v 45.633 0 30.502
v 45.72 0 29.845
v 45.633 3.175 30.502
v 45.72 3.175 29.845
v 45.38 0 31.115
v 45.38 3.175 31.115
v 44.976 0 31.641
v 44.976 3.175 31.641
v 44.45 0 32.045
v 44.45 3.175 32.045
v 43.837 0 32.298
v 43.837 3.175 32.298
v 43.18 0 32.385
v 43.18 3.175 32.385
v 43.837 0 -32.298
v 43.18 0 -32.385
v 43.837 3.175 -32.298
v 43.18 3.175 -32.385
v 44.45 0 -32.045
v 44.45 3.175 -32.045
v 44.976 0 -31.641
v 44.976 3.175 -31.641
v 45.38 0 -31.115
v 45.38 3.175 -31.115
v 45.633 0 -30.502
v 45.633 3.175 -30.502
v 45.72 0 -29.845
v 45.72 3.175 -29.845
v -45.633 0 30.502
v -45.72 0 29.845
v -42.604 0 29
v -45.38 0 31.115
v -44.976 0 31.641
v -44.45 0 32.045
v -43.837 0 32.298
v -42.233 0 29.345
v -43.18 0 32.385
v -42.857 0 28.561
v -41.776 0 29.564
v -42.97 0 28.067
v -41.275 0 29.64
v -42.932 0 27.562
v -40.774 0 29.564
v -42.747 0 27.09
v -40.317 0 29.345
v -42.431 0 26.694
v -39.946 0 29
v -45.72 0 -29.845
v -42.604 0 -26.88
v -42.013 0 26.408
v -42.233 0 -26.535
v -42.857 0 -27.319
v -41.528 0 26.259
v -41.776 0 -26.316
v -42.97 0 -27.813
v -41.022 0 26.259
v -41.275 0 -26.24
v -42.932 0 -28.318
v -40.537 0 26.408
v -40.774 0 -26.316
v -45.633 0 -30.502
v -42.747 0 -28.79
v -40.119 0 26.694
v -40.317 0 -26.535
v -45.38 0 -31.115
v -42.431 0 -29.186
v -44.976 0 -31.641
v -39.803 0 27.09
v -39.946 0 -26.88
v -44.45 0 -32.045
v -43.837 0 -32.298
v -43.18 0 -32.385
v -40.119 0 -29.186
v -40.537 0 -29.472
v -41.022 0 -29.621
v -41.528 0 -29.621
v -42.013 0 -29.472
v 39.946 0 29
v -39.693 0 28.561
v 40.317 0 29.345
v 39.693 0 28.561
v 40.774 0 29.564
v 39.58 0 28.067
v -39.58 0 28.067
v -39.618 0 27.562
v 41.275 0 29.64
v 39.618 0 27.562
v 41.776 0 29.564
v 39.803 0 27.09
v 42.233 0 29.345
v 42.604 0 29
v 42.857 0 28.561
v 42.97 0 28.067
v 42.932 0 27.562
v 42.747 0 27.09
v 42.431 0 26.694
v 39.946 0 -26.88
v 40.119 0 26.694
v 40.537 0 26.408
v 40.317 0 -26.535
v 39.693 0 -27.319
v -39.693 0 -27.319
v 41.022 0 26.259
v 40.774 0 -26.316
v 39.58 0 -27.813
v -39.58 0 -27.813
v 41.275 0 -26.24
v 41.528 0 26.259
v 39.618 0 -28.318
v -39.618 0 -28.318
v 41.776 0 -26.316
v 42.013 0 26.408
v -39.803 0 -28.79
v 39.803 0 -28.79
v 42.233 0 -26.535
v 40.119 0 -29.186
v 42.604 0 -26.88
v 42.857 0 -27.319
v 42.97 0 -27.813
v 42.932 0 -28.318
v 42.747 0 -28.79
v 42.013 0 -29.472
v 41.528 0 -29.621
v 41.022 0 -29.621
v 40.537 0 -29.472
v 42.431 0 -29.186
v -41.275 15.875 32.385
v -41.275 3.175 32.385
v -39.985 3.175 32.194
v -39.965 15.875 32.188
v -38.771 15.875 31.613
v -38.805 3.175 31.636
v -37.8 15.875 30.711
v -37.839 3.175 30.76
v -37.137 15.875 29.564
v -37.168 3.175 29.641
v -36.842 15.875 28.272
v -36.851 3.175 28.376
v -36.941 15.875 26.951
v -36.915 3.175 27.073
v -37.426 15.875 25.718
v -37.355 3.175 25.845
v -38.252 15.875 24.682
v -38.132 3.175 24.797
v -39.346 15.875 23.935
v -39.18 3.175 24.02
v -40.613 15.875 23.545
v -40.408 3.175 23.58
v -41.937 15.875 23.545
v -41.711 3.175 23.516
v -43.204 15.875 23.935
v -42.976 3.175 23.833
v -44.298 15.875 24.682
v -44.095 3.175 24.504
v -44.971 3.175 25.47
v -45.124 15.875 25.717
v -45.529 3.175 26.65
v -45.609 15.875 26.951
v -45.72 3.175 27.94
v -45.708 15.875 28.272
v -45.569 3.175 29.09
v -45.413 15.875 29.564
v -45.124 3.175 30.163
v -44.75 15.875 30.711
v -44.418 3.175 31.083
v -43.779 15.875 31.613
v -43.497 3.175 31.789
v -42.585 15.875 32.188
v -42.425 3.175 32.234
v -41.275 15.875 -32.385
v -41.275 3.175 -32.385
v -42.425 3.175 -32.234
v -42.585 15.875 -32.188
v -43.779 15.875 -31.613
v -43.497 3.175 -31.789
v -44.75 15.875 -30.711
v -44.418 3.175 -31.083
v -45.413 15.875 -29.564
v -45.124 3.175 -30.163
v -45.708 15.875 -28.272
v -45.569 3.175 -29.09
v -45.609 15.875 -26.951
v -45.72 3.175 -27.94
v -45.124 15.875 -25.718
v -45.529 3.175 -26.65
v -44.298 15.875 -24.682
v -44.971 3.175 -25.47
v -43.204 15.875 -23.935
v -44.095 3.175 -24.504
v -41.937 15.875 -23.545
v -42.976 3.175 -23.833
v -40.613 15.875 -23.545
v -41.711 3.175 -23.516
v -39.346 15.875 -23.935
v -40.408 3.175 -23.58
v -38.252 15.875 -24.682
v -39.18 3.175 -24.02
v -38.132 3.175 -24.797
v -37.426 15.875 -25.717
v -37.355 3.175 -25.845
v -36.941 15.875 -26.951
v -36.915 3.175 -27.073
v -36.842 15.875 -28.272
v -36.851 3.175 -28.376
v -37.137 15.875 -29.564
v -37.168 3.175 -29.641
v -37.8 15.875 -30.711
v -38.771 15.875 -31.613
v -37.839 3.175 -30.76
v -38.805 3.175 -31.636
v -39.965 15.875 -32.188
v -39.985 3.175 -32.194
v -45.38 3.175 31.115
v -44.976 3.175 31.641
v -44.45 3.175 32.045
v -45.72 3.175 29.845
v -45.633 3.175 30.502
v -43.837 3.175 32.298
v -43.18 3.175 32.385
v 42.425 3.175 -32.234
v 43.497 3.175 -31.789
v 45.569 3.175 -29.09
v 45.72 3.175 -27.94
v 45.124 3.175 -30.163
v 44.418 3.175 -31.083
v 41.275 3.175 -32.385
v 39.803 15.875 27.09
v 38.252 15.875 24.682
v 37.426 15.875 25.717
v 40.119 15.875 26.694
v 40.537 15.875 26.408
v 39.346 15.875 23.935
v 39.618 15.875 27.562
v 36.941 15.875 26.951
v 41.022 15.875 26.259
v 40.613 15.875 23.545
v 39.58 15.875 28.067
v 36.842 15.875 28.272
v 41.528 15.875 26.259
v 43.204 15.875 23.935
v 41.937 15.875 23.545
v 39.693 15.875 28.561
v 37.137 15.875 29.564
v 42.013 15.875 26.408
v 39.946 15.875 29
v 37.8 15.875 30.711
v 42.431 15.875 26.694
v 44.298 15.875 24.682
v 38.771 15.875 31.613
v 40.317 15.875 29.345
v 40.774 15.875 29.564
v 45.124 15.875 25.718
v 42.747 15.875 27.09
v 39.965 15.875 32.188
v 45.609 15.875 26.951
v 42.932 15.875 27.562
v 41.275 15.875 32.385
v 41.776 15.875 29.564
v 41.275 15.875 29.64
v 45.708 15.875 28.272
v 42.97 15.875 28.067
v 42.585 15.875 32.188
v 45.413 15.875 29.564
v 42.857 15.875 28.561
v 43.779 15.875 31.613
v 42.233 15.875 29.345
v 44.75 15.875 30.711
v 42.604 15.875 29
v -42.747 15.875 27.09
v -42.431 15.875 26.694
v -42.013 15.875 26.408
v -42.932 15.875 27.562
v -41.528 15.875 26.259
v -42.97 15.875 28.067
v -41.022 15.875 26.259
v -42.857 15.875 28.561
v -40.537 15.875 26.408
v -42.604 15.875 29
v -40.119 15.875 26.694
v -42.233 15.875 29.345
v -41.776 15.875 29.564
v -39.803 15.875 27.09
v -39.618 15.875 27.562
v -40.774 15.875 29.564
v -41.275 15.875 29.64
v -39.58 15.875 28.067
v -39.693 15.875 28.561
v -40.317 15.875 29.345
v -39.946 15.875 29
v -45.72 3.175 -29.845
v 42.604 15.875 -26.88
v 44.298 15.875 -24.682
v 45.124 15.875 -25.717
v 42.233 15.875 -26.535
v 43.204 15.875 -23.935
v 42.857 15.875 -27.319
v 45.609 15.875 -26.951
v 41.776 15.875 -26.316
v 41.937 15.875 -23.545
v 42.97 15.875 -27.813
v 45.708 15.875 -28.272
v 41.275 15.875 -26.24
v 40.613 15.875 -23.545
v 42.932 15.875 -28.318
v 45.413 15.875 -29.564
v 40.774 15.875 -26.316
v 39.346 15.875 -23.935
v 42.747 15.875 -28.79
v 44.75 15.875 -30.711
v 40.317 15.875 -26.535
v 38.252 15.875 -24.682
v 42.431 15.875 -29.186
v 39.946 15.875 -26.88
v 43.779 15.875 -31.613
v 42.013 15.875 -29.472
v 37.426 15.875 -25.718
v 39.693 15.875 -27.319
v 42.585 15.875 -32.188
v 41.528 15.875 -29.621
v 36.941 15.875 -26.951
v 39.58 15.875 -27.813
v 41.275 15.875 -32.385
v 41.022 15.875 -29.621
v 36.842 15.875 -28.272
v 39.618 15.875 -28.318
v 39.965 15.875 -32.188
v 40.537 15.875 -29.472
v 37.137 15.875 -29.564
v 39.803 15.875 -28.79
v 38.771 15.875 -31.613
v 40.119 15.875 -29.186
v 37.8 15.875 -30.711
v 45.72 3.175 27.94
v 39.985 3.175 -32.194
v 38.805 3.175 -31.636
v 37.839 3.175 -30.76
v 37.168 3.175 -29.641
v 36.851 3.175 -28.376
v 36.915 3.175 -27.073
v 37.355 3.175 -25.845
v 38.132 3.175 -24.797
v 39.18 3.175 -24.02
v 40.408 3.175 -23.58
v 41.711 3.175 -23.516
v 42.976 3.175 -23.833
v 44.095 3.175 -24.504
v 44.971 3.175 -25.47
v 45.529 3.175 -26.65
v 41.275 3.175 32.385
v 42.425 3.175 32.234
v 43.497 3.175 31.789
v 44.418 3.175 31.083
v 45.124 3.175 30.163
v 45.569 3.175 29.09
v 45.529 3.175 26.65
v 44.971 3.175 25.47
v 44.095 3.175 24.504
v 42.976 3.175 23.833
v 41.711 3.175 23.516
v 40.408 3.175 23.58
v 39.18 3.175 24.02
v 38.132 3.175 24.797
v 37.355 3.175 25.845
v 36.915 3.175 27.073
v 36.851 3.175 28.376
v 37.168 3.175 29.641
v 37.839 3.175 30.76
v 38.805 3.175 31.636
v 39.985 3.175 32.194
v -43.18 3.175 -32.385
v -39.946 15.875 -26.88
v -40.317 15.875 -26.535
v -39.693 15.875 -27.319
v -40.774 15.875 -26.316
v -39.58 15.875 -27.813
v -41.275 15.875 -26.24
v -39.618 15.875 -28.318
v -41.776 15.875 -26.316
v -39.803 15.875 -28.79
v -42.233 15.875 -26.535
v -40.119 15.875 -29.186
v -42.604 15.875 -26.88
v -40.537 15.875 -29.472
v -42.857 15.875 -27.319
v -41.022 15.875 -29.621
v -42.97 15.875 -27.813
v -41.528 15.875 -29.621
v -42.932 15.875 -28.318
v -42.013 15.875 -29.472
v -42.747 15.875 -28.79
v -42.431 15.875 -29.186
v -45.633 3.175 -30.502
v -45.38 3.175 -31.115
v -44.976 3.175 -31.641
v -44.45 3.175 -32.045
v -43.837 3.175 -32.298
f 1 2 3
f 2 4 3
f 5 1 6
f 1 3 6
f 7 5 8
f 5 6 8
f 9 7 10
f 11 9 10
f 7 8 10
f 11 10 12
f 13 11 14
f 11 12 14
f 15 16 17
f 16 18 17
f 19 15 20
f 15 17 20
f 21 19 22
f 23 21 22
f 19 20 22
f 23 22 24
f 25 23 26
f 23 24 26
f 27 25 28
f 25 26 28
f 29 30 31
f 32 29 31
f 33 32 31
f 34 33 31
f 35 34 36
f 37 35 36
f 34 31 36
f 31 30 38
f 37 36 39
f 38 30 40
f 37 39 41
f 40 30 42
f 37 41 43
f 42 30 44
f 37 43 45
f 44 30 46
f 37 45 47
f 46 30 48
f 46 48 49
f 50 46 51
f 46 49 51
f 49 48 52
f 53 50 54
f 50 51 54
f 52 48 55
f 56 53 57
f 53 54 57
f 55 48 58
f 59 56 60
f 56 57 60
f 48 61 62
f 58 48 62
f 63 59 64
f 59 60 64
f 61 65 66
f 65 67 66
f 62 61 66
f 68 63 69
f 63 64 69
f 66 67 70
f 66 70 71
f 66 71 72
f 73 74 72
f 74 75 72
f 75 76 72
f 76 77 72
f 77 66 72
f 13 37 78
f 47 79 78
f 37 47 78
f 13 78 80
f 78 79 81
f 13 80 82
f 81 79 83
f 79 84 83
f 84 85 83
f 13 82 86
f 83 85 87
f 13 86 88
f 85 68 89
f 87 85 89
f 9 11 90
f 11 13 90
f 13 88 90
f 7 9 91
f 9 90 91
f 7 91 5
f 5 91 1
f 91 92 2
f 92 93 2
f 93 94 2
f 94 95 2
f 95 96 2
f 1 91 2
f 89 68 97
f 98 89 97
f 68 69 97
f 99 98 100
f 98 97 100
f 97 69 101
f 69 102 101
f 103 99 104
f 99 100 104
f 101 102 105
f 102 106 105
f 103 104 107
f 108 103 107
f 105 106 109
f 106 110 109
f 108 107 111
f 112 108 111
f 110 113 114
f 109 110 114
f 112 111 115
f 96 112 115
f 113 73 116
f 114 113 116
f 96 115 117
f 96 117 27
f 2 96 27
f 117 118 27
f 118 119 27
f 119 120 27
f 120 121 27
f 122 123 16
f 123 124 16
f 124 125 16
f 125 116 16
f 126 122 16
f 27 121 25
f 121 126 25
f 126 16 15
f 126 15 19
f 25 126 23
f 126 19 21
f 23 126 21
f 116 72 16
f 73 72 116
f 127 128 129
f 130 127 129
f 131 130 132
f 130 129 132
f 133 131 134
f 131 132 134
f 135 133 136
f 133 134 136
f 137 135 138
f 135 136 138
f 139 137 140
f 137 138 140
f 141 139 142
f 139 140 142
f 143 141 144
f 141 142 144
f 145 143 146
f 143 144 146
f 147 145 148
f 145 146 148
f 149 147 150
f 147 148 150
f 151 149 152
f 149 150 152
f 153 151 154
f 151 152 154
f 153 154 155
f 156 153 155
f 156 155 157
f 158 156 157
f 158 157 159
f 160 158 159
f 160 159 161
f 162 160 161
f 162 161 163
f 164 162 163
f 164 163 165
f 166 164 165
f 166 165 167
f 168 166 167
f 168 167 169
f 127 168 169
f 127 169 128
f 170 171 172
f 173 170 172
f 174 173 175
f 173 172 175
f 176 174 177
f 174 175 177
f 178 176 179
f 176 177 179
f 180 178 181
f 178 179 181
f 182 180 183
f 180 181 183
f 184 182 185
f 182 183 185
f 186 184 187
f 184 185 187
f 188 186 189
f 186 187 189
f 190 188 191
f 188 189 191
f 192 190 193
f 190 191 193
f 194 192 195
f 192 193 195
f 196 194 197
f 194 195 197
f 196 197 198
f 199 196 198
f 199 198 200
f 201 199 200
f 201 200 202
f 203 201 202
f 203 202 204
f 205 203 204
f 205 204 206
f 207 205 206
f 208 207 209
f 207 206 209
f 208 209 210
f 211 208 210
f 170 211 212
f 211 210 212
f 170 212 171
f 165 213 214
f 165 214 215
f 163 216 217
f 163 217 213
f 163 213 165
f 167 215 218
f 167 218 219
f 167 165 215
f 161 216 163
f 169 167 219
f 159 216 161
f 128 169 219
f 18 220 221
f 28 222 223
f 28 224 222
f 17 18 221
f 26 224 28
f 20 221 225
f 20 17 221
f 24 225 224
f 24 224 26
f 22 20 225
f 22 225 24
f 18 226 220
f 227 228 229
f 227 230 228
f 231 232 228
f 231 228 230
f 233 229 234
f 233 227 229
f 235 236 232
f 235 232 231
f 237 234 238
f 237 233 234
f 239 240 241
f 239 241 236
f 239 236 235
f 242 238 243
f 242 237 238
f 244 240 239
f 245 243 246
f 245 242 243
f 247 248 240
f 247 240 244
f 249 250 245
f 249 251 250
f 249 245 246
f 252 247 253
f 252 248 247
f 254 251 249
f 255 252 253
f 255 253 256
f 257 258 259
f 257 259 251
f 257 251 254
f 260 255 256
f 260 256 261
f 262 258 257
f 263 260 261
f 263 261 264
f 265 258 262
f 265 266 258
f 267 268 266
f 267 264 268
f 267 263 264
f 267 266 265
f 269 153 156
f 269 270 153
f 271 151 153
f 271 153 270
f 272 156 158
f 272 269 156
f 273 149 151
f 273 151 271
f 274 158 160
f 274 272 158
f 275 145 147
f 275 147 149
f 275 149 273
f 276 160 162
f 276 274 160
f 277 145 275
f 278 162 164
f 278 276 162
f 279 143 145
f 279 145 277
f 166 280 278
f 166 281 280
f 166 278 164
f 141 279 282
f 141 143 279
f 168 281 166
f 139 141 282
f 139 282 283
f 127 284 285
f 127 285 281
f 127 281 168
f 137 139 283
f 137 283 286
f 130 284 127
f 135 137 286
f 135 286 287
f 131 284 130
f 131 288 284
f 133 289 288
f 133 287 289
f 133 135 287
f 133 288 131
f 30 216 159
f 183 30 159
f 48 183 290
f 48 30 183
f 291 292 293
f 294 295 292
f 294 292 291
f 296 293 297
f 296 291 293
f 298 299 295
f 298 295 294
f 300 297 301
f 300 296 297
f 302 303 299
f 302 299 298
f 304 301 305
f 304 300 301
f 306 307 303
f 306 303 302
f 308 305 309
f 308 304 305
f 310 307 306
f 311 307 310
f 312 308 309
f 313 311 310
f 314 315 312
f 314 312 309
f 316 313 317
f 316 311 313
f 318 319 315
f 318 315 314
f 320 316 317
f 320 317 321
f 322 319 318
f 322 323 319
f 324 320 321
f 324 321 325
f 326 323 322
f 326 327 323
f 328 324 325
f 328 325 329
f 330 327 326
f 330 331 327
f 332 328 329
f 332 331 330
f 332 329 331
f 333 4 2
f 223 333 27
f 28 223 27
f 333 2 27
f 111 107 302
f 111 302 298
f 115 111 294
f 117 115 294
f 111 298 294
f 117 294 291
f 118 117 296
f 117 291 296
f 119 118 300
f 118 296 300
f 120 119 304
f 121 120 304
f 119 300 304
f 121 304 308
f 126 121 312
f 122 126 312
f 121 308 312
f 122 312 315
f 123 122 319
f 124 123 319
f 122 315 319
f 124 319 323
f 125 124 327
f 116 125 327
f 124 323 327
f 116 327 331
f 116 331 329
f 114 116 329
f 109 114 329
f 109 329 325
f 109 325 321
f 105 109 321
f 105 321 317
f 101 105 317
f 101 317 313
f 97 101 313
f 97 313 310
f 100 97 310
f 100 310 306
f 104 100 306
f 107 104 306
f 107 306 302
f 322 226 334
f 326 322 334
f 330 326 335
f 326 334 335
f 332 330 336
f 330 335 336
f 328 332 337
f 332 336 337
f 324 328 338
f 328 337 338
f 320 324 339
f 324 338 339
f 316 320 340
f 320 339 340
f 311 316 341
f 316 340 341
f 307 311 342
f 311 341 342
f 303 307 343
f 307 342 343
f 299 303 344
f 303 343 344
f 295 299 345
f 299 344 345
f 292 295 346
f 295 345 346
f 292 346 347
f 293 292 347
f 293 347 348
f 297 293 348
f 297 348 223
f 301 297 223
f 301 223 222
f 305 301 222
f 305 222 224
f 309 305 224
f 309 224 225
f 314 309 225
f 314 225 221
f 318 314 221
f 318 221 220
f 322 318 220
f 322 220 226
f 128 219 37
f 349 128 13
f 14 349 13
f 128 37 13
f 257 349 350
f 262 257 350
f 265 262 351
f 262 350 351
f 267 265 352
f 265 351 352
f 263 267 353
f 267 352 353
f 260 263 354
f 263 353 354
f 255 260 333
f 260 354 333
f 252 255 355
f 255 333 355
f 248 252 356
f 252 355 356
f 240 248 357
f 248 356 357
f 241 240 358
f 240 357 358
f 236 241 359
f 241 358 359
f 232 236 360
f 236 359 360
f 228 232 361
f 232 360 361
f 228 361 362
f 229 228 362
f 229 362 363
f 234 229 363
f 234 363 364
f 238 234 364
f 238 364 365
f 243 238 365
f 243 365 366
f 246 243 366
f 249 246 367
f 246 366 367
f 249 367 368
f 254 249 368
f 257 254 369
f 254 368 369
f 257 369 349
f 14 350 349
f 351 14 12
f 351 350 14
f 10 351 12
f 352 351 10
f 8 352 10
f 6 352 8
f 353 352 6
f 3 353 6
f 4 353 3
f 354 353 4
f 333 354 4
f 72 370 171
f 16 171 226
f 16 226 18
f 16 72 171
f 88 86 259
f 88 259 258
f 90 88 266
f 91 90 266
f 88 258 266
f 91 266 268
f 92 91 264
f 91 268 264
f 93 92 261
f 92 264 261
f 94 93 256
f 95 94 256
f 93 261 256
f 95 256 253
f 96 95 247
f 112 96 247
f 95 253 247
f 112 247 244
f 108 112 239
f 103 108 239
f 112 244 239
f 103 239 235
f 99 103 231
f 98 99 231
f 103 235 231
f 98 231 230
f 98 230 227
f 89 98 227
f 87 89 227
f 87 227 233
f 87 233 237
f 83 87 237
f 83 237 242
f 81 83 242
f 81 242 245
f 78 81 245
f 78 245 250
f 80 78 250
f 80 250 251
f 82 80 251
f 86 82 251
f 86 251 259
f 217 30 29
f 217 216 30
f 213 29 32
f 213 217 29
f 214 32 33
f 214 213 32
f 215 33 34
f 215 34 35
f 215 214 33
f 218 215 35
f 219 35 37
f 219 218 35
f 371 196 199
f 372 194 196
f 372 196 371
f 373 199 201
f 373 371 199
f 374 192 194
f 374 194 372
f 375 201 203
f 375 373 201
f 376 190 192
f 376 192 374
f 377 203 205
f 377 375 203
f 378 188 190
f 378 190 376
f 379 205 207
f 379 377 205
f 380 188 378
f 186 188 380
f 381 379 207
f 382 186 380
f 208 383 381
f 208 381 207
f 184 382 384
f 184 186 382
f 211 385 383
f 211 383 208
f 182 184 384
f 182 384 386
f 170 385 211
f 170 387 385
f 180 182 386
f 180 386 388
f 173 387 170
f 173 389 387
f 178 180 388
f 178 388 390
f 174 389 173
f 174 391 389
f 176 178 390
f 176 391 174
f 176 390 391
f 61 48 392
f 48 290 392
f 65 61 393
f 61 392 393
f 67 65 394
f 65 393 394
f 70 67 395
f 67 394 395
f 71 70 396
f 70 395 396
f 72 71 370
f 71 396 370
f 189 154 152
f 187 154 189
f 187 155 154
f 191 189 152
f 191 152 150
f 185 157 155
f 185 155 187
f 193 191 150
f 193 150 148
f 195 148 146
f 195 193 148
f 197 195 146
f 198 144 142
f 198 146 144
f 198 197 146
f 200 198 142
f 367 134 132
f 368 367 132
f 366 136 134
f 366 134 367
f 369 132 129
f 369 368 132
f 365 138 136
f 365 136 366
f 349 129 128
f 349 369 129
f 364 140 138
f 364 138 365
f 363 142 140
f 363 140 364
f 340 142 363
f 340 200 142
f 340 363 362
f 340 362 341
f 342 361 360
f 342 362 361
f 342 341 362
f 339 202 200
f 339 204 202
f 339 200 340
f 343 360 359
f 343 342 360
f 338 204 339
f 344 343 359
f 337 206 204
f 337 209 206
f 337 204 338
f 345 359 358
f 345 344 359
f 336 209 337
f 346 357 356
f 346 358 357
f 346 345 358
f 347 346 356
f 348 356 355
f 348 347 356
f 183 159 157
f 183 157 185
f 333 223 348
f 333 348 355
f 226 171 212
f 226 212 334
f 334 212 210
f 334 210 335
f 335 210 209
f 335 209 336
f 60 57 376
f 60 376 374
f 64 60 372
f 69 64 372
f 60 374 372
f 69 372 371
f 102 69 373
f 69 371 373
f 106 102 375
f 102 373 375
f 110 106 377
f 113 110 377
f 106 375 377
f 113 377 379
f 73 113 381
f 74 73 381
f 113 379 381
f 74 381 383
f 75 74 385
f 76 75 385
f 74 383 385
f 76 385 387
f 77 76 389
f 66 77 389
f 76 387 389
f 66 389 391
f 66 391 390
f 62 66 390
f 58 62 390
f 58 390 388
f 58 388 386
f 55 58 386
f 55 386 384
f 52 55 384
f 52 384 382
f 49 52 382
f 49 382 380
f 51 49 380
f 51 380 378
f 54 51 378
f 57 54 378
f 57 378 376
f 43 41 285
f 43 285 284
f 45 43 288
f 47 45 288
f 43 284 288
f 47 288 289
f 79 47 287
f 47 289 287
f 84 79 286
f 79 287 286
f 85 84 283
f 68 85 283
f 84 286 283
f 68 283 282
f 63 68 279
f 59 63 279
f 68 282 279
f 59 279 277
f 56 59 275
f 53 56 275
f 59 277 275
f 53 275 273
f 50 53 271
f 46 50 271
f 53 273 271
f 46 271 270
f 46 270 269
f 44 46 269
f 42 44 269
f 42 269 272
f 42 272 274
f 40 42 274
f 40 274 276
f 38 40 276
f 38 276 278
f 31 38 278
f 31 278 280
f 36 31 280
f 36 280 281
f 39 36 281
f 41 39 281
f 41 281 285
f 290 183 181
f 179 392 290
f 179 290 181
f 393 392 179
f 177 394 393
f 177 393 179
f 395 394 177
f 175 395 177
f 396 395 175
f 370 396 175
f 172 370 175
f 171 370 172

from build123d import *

# Parameters (mm, degrees)
SKETCH1_W           = 91.44
SKETCH1_H           = 64.77
BOSS_EXTRUDE1_DEPTH = 3.175
SKETCH2_R           = 4.445
BOSS_EXTRUDE2_DEPTH = 12.7
SKETCH3_R           = 1.6999966
CUT_EXTRUDE1_DEPTH  = 59.233343112
FILLET1_R           = 2.54


with BuildPart() as part:
    # Sketch1 → Boss-Extrude1 (new body)
    with BuildSketch(Plane(origin=(0, 0, 0), x_dir=(1, 0, 0), z_dir=(0, 1, 0))):
        Rectangle(SKETCH1_W, SKETCH1_H)
    extrude(amount=BOSS_EXTRUDE1_DEPTH)

    # Sketch2 → Boss-Extrude2 (add)
    with BuildSketch(Plane(origin=(0, 3.175, 0), x_dir=(1, 0, 0), z_dir=(0, 1, 0))):
        with Locations(Location((-41.275, 27.94, 0), (0, 0, 90))):
            Circle(SKETCH2_R)
        with Locations(Location((41.275, 27.94, 0), (0, 0, 90))):
            Circle(SKETCH2_R)
        with Locations(Location((41.275, -27.94, 0), (0, 0, 270))):
            Circle(SKETCH2_R)
        with Locations(Location((-41.275, -27.94, 0), (0, 0, 270))):
            Circle(SKETCH2_R)
    extrude(amount=BOSS_EXTRUDE2_DEPTH)

    # Sketch3 → Cut-Extrude1 (cut, through all)
    with BuildSketch(Plane(origin=(0, 15.875, 0), x_dir=(1, 0, 0), z_dir=(0, 1, 0))):
        with Locations(Location((-41.275, 27.94, 0), (0, 0, 270))):
            Circle(SKETCH3_R)
        with Locations(Location((41.275, 27.94, 0), (0, 0, 270))):
            Circle(SKETCH3_R)
        with Locations(Location((41.275, -27.94, 0), (0, 0, 270))):
            Circle(SKETCH3_R)
        with Locations(Location((-41.275, -27.94, 0), (0, 0, 270))):
            Circle(SKETCH3_R)
    extrude(amount=-CUT_EXTRUDE1_DEPTH, mode=Mode.SUBTRACT)

    # Fillet1
    fillet1_edges = [part.edges().sort_by_distance(p)[0] for p in [
        (45.72, 1.5875, 32.385),
        (-45.72, 1.5875, 32.385),
        (-45.72, 1.5875, -32.385),
        (45.72, 1.5875, -32.385),
    ]]
    fillet(fillet1_edges, radius=FILLET1_R)


solid = part.part
